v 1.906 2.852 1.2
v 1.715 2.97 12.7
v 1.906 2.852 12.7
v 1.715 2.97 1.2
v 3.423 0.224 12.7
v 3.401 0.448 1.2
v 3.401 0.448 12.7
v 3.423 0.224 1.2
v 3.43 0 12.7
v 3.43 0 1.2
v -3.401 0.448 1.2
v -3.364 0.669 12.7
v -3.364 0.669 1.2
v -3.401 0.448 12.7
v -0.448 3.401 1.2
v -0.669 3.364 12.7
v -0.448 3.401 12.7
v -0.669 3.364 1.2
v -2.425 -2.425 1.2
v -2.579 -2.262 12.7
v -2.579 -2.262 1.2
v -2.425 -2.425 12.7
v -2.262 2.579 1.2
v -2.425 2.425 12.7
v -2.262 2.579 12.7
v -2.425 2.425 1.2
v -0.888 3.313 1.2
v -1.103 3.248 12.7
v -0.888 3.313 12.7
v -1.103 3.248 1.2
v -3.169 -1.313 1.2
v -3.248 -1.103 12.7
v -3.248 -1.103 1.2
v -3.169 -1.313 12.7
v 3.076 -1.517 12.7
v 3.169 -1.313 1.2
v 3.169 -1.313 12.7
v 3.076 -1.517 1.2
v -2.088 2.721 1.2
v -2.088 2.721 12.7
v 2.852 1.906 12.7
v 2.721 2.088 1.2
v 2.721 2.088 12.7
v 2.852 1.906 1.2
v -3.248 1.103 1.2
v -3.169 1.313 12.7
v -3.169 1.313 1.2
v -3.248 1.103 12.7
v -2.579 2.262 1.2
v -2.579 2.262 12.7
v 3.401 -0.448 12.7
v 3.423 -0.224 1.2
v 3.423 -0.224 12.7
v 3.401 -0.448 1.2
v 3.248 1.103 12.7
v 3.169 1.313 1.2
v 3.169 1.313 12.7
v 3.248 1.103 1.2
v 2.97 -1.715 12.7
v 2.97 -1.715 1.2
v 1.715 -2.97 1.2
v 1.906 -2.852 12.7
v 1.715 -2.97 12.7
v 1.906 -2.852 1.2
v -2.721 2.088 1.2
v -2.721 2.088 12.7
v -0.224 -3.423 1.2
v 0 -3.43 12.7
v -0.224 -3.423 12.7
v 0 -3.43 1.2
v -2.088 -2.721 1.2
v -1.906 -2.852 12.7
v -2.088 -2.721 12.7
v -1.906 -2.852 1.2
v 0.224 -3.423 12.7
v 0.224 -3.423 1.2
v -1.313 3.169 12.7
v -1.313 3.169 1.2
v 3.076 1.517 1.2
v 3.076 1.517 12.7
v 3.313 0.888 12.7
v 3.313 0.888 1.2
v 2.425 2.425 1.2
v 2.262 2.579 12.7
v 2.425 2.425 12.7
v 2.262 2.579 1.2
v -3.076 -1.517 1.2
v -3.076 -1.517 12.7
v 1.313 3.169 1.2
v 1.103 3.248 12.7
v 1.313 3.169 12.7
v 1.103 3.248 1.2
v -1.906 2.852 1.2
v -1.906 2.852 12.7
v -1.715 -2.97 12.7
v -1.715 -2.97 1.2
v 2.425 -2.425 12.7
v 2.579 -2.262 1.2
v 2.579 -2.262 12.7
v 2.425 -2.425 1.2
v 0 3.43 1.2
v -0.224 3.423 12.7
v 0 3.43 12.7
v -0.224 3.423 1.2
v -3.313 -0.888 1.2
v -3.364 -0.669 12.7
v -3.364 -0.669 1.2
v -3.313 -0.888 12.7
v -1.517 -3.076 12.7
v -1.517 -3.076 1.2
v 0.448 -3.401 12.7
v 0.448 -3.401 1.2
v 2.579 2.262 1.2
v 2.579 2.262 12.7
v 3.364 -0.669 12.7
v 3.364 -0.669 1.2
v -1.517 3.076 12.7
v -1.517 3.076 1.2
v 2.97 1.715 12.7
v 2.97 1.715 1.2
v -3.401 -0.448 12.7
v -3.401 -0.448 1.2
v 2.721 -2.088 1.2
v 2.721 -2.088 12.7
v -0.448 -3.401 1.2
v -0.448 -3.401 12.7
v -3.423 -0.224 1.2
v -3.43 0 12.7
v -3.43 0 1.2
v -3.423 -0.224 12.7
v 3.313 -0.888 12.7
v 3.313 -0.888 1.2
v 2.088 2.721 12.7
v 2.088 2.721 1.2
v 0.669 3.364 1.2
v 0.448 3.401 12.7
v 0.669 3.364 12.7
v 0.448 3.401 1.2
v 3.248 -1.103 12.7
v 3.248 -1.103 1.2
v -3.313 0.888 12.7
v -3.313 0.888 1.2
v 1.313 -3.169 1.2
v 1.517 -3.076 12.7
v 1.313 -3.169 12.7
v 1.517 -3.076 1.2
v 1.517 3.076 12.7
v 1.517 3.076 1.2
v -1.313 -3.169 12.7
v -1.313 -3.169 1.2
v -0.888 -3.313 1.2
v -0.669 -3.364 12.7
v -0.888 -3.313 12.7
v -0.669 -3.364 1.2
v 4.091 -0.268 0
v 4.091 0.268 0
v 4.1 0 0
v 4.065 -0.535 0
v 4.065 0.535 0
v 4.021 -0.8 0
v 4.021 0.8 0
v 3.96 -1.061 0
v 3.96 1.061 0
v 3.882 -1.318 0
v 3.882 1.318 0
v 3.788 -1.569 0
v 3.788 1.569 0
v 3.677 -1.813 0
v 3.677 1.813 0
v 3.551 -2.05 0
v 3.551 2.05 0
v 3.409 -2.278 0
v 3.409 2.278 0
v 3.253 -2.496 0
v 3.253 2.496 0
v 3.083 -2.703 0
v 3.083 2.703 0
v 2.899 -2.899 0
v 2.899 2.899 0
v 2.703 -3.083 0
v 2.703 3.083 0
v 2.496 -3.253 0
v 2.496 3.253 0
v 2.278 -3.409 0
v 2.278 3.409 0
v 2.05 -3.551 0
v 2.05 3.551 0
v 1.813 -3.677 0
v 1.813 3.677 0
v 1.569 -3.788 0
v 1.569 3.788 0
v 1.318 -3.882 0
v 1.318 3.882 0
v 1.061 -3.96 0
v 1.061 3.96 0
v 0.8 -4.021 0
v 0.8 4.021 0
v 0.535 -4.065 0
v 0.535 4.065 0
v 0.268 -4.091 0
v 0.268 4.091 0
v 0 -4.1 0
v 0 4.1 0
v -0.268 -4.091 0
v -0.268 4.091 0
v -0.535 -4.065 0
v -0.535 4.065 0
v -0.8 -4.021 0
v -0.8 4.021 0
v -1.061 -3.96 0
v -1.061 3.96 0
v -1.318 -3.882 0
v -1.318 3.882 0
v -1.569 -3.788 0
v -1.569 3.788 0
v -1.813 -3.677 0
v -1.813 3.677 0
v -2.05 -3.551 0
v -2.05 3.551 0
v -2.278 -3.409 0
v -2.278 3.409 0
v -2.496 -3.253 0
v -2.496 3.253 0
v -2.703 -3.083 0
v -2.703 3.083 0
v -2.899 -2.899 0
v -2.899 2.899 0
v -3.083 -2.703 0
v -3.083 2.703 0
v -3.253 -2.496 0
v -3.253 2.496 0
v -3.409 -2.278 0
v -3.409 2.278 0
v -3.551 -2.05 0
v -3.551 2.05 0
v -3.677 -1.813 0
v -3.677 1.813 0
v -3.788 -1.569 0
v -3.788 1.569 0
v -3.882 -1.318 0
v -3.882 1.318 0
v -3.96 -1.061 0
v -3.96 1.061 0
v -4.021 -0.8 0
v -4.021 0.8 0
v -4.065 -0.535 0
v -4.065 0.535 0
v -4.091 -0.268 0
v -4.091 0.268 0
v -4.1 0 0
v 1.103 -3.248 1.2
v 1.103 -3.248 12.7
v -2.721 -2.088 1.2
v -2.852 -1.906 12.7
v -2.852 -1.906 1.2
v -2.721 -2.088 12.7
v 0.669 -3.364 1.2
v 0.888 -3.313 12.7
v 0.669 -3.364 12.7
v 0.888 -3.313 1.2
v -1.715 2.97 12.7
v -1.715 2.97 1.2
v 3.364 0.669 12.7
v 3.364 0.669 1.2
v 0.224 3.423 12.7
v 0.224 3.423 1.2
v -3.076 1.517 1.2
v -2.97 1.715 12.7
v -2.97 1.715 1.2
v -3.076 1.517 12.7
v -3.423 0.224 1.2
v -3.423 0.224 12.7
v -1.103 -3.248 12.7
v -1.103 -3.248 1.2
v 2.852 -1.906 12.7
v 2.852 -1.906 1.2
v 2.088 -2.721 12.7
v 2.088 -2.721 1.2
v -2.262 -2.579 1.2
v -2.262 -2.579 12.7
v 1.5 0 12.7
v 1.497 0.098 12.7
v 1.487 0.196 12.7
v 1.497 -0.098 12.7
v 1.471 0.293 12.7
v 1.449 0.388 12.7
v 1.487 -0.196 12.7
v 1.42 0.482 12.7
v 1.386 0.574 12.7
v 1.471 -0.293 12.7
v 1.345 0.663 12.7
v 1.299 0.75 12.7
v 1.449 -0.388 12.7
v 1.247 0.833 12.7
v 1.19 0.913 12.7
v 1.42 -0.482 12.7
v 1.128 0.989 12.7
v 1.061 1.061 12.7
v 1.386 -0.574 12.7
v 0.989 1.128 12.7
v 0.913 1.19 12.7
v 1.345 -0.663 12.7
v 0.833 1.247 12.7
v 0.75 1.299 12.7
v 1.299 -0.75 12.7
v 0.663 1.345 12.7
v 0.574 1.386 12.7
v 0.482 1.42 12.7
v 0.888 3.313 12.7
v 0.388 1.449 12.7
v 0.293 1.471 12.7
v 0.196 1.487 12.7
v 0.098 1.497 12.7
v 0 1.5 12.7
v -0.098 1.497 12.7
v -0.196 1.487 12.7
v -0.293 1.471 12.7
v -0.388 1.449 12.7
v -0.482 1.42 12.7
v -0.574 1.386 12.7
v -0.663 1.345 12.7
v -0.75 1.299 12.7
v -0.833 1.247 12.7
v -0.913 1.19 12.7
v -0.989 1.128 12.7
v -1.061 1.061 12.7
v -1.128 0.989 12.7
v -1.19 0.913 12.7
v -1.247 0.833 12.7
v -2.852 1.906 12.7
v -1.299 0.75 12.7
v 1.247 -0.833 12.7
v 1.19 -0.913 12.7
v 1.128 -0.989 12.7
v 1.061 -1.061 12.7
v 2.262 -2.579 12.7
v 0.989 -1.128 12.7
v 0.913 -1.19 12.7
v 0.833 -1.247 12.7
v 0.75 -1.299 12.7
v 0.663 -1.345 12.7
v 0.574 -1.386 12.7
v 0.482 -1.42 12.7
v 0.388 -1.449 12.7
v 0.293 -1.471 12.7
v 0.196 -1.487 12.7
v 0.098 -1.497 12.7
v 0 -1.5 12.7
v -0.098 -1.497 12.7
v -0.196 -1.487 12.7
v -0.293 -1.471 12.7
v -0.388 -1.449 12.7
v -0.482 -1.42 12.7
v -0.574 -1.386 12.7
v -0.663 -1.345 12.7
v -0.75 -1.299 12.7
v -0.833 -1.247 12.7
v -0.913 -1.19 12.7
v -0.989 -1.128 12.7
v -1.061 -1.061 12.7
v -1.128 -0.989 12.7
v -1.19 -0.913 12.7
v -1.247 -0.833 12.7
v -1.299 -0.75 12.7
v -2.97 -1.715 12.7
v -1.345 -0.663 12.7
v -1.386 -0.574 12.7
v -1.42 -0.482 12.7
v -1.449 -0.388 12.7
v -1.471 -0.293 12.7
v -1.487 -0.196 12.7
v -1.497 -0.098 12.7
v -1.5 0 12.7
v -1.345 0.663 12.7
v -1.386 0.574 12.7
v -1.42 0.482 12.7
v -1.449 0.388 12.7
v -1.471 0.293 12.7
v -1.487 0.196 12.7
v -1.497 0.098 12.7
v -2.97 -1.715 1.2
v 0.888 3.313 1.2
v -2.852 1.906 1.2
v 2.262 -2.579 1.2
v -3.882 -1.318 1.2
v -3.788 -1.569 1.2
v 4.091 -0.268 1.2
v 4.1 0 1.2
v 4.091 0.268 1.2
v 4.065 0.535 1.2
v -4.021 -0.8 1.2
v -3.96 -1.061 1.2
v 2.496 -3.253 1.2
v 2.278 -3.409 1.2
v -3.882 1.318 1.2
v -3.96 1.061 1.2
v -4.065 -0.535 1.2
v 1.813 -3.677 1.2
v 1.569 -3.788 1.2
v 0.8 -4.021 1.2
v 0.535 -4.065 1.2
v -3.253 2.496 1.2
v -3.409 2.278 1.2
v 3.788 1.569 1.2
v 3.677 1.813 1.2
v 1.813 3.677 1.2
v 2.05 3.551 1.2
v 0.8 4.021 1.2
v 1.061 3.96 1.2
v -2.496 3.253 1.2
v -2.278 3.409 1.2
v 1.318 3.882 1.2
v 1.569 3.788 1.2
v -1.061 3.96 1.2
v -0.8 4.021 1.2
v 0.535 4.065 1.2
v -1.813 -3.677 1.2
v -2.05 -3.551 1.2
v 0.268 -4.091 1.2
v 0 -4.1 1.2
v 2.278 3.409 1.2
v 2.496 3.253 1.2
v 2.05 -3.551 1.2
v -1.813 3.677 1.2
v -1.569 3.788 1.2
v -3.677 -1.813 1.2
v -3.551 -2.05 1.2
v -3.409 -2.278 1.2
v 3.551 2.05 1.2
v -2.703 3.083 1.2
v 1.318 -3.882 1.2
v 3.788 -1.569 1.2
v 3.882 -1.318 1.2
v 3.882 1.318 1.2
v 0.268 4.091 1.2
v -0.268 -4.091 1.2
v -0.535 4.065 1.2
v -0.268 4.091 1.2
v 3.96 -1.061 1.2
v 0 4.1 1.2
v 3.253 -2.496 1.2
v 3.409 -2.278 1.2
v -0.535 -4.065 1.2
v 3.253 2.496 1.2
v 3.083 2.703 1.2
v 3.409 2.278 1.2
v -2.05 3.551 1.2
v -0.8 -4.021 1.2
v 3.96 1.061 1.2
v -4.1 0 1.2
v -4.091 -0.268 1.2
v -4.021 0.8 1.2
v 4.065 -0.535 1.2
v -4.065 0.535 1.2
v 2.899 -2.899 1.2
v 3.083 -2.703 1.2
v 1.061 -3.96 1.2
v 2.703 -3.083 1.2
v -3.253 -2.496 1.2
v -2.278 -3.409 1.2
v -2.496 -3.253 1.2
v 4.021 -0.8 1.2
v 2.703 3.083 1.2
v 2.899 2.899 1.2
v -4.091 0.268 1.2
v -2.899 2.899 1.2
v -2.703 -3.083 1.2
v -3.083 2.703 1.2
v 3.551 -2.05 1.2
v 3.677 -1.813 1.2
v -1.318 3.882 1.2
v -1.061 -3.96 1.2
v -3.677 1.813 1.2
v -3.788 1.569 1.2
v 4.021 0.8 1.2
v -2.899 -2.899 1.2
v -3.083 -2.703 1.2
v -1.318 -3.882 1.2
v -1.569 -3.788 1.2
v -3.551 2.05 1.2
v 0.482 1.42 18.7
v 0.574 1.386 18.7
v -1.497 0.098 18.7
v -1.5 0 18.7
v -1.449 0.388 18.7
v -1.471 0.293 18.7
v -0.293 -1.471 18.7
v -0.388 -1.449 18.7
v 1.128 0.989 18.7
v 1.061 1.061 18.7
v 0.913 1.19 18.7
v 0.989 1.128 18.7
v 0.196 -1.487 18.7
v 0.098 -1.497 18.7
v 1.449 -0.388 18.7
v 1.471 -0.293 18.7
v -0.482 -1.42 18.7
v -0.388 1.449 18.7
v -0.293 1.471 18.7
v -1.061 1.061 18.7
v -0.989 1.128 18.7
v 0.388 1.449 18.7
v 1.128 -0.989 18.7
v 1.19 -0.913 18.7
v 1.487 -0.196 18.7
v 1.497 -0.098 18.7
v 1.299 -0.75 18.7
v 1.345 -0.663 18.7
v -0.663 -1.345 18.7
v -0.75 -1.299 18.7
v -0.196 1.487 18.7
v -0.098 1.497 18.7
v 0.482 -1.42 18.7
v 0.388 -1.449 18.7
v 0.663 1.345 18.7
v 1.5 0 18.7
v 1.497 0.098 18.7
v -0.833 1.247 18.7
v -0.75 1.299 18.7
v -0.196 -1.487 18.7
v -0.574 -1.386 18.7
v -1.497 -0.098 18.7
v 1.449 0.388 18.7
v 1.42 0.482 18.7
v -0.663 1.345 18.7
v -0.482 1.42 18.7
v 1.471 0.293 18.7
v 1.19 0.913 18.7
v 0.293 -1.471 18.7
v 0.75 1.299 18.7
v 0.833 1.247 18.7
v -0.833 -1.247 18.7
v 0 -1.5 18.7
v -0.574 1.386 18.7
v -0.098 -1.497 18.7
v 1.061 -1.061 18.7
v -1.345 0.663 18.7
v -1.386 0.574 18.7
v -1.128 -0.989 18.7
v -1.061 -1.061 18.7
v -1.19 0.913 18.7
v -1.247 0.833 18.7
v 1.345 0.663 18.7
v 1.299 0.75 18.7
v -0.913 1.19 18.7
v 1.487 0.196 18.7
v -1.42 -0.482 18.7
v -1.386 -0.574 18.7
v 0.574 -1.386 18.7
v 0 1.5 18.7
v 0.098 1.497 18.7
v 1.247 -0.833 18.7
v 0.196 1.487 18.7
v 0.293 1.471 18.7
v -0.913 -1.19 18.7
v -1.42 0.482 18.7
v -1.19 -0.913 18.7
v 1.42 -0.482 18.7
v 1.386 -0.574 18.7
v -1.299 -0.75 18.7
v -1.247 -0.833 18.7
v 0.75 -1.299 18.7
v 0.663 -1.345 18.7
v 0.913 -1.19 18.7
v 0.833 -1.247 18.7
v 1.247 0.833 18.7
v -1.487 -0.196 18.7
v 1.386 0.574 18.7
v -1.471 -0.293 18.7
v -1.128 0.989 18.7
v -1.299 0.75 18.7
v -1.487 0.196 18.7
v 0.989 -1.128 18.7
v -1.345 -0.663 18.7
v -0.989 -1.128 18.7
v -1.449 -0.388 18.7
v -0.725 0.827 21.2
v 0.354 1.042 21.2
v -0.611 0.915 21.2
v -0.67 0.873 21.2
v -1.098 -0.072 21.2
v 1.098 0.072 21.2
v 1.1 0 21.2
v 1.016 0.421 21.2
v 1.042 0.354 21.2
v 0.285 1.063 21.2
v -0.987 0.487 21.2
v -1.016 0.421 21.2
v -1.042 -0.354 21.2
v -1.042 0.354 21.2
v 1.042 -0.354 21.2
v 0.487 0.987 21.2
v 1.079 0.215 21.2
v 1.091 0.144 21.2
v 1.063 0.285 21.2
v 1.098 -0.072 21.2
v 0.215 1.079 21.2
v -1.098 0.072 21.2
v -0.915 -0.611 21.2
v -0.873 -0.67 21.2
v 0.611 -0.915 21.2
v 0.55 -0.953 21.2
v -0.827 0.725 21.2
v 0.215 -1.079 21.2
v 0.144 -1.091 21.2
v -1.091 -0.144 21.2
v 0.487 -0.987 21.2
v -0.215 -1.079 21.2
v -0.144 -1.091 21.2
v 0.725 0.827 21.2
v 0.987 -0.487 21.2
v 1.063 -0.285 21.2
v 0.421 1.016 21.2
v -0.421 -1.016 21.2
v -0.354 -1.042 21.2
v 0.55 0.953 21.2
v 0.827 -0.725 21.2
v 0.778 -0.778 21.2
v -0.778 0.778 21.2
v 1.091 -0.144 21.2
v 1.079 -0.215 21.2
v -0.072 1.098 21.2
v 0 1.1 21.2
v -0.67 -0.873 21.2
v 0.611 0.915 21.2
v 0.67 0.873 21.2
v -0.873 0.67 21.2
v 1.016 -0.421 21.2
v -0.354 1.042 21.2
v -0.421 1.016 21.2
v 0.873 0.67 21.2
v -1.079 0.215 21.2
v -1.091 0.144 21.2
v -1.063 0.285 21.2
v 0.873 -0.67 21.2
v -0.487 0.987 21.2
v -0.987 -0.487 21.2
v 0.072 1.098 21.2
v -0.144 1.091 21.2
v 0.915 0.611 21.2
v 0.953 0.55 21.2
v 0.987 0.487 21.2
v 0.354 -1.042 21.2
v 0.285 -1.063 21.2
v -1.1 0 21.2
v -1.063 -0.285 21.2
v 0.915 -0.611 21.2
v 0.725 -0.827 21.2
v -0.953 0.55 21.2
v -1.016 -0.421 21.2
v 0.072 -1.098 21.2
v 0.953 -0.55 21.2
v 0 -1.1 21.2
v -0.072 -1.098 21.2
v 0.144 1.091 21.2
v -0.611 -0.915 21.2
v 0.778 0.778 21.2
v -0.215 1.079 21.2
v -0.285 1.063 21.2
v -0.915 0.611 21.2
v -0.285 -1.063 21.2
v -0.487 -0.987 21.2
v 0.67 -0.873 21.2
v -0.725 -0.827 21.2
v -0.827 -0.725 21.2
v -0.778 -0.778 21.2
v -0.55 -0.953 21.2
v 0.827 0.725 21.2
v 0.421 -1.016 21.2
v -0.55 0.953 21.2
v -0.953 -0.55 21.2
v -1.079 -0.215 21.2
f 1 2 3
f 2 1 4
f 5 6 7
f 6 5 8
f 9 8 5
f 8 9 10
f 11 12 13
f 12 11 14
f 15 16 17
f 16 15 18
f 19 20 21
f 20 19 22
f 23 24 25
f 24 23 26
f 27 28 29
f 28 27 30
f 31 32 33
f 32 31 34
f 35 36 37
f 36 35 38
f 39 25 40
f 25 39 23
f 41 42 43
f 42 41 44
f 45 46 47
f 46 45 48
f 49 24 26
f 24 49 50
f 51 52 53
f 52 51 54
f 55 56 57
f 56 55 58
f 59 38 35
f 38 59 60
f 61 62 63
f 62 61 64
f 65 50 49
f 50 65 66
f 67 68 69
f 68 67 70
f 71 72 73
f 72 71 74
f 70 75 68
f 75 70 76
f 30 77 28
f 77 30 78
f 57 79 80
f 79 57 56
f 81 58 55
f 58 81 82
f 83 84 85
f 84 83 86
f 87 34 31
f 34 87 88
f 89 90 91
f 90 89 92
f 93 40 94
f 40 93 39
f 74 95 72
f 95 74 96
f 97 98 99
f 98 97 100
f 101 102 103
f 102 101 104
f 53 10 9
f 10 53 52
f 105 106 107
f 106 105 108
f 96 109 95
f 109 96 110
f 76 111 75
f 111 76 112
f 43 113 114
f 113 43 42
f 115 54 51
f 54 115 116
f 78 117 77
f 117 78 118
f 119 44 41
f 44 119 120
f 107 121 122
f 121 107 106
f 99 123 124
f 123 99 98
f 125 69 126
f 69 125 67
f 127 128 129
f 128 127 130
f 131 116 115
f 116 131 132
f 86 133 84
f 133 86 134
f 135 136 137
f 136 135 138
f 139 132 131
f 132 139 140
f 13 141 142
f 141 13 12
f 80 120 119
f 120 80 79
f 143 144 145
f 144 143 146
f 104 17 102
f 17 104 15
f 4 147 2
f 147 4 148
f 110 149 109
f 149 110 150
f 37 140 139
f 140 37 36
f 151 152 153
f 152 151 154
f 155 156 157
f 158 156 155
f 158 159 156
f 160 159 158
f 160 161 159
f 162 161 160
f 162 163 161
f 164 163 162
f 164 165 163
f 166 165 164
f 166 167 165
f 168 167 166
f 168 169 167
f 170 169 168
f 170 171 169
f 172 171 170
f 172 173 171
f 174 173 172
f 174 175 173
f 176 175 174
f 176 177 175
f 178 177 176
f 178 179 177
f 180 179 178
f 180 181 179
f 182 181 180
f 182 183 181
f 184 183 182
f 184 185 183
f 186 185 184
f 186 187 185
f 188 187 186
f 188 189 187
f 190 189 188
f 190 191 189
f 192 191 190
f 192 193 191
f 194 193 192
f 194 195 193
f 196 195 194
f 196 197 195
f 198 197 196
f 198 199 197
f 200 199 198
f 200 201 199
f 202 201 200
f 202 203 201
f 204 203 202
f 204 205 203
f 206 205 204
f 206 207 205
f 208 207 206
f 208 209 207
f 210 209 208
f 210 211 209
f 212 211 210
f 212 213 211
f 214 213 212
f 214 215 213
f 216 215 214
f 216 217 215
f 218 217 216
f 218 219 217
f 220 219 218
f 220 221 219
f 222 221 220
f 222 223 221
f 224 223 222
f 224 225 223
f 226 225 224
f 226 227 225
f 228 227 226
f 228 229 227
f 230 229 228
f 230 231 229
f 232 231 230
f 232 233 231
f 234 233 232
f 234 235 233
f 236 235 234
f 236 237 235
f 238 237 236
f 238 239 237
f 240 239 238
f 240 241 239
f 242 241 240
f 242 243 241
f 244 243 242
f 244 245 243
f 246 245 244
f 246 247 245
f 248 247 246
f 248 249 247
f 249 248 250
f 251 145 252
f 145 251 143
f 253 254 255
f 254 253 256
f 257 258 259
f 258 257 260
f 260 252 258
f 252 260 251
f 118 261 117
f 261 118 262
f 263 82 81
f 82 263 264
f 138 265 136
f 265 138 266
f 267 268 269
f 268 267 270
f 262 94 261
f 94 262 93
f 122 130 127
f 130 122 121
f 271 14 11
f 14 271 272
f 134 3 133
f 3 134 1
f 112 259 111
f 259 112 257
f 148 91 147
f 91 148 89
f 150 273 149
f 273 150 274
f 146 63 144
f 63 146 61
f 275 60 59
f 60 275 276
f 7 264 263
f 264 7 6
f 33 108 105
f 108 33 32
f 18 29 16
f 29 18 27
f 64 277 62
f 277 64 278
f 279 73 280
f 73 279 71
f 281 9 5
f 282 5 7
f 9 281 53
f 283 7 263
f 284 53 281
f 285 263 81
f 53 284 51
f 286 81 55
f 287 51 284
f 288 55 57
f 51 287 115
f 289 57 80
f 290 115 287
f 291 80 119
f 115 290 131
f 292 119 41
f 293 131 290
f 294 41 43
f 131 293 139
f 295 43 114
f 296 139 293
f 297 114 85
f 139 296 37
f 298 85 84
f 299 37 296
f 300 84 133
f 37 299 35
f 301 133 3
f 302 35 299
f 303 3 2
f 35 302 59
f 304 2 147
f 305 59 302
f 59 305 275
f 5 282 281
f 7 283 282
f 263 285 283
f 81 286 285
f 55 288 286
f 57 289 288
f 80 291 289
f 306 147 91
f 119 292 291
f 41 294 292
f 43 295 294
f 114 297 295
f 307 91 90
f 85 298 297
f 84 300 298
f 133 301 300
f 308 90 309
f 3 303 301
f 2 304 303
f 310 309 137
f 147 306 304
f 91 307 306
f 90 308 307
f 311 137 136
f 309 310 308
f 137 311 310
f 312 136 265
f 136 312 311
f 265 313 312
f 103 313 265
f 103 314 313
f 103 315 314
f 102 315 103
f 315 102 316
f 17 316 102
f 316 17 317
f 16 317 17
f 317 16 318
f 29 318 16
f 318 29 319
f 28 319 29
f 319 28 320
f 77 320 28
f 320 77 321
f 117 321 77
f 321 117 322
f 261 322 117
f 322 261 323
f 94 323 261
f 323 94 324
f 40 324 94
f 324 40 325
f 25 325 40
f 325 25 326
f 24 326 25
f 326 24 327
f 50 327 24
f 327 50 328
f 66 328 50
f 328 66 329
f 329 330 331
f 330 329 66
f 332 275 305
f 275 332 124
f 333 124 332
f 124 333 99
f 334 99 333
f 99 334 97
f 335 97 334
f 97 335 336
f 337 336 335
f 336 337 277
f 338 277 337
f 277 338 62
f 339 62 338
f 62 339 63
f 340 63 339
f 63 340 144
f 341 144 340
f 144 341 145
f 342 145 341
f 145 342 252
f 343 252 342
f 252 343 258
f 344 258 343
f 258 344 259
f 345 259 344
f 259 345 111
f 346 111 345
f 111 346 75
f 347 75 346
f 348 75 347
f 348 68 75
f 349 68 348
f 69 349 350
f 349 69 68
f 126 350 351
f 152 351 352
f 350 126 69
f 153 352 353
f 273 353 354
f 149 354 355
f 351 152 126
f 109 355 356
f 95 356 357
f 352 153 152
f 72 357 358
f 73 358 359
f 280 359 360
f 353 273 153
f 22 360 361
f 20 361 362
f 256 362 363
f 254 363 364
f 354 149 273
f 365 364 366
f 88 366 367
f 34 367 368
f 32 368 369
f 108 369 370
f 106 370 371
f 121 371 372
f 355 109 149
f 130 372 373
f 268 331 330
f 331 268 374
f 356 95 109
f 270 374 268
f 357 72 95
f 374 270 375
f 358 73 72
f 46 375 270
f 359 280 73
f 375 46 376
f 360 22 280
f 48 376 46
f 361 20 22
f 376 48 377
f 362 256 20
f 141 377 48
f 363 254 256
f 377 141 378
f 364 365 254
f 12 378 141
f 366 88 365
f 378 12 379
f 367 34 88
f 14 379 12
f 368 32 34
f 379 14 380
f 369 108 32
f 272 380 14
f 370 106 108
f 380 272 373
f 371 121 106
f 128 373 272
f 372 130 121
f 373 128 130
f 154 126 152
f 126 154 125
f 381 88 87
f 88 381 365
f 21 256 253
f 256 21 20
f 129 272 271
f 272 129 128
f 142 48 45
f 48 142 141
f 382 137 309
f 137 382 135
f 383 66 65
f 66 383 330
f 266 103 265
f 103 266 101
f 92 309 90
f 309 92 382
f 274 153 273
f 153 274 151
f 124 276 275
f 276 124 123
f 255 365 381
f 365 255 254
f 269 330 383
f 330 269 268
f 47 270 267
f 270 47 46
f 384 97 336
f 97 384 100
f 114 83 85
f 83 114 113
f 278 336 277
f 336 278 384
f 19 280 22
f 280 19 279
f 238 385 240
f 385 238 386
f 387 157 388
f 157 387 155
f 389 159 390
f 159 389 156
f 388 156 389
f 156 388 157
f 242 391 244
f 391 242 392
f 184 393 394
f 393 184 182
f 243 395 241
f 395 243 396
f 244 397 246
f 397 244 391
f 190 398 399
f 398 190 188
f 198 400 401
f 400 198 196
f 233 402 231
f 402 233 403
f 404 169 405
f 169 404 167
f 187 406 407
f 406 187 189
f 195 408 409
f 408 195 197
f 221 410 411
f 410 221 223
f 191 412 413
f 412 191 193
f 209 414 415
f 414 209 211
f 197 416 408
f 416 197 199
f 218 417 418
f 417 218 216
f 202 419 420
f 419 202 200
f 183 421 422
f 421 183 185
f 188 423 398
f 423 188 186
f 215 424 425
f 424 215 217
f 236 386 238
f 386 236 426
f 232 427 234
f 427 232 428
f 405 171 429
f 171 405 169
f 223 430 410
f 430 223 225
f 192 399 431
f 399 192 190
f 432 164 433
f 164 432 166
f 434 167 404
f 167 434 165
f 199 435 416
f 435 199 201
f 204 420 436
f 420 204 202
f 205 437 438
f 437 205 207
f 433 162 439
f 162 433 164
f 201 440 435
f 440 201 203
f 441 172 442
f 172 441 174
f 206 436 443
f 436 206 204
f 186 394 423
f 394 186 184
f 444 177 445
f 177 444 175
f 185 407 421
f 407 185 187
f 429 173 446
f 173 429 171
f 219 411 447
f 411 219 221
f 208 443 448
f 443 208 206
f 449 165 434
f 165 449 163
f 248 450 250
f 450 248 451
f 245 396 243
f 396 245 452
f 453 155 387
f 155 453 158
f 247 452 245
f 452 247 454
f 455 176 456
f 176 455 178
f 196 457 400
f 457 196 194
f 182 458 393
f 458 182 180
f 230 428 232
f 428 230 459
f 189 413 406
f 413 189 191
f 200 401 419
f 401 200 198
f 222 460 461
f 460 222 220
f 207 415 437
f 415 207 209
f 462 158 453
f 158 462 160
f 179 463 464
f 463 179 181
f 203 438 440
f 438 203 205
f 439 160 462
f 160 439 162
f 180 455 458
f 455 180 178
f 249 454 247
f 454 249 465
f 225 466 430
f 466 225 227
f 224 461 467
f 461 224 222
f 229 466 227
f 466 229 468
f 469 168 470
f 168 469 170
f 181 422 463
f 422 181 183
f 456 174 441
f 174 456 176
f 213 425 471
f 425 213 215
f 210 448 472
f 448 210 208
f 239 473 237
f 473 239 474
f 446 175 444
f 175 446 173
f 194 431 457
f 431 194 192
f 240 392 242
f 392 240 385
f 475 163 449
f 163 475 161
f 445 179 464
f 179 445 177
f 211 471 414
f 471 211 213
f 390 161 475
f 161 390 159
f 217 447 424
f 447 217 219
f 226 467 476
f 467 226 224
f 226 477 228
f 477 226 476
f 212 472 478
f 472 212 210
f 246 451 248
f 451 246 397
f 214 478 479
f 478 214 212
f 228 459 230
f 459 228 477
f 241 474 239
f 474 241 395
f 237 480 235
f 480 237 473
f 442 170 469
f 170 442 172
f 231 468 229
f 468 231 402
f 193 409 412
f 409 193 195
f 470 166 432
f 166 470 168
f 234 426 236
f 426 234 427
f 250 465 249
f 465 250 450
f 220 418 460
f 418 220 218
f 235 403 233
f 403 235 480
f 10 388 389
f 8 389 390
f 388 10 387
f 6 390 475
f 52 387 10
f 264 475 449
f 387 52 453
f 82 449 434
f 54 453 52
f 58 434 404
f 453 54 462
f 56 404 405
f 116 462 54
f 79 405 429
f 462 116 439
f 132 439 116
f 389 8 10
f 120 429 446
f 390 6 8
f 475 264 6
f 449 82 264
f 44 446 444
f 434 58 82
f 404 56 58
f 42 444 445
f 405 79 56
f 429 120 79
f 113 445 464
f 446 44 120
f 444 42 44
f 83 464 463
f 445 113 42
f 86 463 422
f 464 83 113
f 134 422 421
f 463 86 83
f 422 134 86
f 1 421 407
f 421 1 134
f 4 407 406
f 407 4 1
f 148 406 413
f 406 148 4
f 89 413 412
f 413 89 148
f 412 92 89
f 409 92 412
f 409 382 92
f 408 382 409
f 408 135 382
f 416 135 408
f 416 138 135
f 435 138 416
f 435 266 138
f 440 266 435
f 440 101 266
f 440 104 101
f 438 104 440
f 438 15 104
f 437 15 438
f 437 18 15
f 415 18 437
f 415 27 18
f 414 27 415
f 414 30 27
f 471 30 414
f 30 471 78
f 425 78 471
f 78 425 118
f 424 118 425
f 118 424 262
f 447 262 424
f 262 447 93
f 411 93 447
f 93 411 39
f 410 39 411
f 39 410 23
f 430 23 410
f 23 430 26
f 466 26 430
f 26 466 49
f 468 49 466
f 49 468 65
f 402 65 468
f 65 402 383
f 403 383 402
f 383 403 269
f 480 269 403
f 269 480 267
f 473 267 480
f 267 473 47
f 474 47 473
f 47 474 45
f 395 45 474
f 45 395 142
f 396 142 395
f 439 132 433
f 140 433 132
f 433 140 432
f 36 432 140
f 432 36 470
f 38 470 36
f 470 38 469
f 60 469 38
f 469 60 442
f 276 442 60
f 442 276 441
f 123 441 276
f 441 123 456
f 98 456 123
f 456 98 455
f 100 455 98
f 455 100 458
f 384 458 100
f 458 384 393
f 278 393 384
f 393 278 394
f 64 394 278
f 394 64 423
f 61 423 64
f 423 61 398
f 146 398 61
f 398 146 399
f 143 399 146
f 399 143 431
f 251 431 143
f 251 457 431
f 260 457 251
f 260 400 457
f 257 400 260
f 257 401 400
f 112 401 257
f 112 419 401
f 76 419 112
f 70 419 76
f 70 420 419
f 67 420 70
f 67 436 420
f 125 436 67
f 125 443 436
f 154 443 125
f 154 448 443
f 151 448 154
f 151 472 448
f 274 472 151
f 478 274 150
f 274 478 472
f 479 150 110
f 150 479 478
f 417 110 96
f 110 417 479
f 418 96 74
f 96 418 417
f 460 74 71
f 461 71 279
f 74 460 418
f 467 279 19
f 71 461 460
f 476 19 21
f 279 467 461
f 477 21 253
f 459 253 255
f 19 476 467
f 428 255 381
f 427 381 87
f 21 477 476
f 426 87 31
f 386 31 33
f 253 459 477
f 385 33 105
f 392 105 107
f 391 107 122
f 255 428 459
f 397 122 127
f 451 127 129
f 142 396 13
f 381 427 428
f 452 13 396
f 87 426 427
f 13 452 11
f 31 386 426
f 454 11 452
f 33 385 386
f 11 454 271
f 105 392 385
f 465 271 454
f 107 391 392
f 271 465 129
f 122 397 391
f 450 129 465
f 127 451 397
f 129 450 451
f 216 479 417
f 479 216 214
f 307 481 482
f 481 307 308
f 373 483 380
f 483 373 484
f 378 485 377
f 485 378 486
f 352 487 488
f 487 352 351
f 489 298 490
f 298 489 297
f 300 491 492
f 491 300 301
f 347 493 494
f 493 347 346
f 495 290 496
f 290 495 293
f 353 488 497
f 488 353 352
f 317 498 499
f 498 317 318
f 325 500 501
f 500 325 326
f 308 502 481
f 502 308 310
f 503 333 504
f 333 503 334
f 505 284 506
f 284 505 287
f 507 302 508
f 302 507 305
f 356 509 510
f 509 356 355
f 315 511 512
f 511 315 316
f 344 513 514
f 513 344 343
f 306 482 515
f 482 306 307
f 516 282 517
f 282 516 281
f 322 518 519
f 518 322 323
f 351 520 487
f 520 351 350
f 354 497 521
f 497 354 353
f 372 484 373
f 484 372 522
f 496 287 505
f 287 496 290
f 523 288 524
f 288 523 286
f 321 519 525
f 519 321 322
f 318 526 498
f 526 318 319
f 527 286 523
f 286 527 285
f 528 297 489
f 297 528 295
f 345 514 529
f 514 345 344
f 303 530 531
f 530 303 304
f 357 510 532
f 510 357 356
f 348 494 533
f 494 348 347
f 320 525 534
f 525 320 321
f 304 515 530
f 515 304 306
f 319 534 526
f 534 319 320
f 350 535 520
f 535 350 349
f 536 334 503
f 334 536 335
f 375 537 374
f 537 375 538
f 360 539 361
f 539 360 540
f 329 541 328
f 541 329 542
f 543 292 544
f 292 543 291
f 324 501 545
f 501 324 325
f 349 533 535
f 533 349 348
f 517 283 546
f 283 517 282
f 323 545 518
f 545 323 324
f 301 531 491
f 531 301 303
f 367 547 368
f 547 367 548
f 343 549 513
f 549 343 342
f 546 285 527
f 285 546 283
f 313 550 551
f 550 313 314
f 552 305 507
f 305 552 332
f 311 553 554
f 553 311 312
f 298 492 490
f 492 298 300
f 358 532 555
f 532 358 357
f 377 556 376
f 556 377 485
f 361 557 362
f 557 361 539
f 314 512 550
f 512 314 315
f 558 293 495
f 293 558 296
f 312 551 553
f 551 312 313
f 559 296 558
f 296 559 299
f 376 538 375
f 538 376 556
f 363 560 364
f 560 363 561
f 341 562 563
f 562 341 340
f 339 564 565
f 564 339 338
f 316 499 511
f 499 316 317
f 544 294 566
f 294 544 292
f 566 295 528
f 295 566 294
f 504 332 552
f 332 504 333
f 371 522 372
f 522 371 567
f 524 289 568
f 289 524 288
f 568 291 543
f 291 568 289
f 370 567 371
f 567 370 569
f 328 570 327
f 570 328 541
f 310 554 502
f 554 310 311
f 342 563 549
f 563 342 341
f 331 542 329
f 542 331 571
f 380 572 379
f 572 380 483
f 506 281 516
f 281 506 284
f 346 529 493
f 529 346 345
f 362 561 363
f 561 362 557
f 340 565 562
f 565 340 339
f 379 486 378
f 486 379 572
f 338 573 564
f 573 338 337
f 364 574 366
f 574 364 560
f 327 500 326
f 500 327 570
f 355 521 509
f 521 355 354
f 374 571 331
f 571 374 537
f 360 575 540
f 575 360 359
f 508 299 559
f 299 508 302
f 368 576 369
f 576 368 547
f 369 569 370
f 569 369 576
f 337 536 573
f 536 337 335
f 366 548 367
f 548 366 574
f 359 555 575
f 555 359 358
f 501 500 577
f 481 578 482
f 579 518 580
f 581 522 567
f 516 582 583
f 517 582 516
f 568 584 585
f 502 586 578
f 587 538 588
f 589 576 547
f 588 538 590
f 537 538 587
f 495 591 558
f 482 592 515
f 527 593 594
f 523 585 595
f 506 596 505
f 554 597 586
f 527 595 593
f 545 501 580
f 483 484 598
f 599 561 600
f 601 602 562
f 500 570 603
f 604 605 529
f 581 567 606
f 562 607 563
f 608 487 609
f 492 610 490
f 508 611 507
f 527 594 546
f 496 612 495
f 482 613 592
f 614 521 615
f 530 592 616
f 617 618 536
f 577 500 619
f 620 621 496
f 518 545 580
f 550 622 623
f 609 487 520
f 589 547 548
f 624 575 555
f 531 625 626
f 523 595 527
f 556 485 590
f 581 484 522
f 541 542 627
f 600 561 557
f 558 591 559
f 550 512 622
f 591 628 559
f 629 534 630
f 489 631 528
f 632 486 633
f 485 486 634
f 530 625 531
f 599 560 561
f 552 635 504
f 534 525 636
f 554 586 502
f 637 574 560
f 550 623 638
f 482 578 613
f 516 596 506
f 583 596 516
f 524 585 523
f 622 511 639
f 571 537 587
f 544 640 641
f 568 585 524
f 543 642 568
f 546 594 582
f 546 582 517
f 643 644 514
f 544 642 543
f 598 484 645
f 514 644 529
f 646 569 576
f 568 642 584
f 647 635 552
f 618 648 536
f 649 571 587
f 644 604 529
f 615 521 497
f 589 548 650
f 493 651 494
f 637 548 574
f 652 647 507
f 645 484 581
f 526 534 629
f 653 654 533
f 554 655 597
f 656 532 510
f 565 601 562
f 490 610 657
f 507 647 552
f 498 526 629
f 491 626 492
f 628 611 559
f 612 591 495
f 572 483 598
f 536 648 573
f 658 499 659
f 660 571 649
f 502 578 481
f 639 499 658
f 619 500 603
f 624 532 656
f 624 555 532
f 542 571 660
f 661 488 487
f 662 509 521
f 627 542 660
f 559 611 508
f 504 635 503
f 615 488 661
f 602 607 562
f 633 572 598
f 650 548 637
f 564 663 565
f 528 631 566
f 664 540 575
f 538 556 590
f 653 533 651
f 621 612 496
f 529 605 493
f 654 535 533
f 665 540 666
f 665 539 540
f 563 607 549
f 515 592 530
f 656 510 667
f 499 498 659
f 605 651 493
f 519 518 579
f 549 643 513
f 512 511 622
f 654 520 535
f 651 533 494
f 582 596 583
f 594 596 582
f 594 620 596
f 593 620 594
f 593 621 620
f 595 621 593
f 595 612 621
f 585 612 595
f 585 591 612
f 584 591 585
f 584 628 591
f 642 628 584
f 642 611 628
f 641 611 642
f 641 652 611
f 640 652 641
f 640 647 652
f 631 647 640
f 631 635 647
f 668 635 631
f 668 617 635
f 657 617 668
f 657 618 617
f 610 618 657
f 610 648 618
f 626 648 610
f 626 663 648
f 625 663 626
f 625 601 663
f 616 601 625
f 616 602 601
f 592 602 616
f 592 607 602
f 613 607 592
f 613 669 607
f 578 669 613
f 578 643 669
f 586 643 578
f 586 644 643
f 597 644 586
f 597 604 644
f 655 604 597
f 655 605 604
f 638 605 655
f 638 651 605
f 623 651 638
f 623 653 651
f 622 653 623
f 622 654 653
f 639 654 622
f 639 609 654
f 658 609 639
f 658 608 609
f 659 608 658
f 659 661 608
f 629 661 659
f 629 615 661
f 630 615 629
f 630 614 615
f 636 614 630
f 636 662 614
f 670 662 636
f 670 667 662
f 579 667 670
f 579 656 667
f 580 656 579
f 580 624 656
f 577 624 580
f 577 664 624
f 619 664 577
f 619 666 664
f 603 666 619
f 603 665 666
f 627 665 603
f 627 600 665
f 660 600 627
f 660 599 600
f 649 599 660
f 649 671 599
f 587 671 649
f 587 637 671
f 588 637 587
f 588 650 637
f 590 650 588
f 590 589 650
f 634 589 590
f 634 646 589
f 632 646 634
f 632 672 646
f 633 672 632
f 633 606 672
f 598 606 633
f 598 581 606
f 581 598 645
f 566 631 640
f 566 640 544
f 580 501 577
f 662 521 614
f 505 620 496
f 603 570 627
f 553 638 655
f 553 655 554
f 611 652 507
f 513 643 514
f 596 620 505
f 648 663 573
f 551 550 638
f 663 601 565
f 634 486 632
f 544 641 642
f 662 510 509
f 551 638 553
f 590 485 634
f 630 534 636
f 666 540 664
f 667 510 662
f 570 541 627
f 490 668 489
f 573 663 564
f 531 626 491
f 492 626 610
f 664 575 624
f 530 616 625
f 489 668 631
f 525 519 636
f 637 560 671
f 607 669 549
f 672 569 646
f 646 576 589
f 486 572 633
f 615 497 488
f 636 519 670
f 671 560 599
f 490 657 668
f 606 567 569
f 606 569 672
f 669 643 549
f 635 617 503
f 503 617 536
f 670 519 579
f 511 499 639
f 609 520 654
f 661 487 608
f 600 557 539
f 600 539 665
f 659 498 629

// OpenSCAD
$fn = 96;

body_d = 6.86;
body_h = 12.7;

stem_d = 3.0;
stem_h = 6.0;

tip_d = 2.2;
tip_h = 2.5;

base_flange_d = 8.2;
base_flange_h = 1.2;

module toggle_switch() {
    union() {
        // Main cylindrical body
        cylinder(d = body_d, h = body_h);

        // Base flange (slightly larger ring at bottom)
        translate([0,0,0])
            cylinder(d = base_flange_d, h = base_flange_h);

        // Stem on top
        translate([0,0,body_h])
            cylinder(d = stem_d, h = stem_h);

        // Rounded-ish tip (simple taper)
        translate([0,0,body_h + stem_h])
            cylinder(d1 = stem_d, d2 = tip_d, h = tip_h);
    }
}

toggle_switch();
